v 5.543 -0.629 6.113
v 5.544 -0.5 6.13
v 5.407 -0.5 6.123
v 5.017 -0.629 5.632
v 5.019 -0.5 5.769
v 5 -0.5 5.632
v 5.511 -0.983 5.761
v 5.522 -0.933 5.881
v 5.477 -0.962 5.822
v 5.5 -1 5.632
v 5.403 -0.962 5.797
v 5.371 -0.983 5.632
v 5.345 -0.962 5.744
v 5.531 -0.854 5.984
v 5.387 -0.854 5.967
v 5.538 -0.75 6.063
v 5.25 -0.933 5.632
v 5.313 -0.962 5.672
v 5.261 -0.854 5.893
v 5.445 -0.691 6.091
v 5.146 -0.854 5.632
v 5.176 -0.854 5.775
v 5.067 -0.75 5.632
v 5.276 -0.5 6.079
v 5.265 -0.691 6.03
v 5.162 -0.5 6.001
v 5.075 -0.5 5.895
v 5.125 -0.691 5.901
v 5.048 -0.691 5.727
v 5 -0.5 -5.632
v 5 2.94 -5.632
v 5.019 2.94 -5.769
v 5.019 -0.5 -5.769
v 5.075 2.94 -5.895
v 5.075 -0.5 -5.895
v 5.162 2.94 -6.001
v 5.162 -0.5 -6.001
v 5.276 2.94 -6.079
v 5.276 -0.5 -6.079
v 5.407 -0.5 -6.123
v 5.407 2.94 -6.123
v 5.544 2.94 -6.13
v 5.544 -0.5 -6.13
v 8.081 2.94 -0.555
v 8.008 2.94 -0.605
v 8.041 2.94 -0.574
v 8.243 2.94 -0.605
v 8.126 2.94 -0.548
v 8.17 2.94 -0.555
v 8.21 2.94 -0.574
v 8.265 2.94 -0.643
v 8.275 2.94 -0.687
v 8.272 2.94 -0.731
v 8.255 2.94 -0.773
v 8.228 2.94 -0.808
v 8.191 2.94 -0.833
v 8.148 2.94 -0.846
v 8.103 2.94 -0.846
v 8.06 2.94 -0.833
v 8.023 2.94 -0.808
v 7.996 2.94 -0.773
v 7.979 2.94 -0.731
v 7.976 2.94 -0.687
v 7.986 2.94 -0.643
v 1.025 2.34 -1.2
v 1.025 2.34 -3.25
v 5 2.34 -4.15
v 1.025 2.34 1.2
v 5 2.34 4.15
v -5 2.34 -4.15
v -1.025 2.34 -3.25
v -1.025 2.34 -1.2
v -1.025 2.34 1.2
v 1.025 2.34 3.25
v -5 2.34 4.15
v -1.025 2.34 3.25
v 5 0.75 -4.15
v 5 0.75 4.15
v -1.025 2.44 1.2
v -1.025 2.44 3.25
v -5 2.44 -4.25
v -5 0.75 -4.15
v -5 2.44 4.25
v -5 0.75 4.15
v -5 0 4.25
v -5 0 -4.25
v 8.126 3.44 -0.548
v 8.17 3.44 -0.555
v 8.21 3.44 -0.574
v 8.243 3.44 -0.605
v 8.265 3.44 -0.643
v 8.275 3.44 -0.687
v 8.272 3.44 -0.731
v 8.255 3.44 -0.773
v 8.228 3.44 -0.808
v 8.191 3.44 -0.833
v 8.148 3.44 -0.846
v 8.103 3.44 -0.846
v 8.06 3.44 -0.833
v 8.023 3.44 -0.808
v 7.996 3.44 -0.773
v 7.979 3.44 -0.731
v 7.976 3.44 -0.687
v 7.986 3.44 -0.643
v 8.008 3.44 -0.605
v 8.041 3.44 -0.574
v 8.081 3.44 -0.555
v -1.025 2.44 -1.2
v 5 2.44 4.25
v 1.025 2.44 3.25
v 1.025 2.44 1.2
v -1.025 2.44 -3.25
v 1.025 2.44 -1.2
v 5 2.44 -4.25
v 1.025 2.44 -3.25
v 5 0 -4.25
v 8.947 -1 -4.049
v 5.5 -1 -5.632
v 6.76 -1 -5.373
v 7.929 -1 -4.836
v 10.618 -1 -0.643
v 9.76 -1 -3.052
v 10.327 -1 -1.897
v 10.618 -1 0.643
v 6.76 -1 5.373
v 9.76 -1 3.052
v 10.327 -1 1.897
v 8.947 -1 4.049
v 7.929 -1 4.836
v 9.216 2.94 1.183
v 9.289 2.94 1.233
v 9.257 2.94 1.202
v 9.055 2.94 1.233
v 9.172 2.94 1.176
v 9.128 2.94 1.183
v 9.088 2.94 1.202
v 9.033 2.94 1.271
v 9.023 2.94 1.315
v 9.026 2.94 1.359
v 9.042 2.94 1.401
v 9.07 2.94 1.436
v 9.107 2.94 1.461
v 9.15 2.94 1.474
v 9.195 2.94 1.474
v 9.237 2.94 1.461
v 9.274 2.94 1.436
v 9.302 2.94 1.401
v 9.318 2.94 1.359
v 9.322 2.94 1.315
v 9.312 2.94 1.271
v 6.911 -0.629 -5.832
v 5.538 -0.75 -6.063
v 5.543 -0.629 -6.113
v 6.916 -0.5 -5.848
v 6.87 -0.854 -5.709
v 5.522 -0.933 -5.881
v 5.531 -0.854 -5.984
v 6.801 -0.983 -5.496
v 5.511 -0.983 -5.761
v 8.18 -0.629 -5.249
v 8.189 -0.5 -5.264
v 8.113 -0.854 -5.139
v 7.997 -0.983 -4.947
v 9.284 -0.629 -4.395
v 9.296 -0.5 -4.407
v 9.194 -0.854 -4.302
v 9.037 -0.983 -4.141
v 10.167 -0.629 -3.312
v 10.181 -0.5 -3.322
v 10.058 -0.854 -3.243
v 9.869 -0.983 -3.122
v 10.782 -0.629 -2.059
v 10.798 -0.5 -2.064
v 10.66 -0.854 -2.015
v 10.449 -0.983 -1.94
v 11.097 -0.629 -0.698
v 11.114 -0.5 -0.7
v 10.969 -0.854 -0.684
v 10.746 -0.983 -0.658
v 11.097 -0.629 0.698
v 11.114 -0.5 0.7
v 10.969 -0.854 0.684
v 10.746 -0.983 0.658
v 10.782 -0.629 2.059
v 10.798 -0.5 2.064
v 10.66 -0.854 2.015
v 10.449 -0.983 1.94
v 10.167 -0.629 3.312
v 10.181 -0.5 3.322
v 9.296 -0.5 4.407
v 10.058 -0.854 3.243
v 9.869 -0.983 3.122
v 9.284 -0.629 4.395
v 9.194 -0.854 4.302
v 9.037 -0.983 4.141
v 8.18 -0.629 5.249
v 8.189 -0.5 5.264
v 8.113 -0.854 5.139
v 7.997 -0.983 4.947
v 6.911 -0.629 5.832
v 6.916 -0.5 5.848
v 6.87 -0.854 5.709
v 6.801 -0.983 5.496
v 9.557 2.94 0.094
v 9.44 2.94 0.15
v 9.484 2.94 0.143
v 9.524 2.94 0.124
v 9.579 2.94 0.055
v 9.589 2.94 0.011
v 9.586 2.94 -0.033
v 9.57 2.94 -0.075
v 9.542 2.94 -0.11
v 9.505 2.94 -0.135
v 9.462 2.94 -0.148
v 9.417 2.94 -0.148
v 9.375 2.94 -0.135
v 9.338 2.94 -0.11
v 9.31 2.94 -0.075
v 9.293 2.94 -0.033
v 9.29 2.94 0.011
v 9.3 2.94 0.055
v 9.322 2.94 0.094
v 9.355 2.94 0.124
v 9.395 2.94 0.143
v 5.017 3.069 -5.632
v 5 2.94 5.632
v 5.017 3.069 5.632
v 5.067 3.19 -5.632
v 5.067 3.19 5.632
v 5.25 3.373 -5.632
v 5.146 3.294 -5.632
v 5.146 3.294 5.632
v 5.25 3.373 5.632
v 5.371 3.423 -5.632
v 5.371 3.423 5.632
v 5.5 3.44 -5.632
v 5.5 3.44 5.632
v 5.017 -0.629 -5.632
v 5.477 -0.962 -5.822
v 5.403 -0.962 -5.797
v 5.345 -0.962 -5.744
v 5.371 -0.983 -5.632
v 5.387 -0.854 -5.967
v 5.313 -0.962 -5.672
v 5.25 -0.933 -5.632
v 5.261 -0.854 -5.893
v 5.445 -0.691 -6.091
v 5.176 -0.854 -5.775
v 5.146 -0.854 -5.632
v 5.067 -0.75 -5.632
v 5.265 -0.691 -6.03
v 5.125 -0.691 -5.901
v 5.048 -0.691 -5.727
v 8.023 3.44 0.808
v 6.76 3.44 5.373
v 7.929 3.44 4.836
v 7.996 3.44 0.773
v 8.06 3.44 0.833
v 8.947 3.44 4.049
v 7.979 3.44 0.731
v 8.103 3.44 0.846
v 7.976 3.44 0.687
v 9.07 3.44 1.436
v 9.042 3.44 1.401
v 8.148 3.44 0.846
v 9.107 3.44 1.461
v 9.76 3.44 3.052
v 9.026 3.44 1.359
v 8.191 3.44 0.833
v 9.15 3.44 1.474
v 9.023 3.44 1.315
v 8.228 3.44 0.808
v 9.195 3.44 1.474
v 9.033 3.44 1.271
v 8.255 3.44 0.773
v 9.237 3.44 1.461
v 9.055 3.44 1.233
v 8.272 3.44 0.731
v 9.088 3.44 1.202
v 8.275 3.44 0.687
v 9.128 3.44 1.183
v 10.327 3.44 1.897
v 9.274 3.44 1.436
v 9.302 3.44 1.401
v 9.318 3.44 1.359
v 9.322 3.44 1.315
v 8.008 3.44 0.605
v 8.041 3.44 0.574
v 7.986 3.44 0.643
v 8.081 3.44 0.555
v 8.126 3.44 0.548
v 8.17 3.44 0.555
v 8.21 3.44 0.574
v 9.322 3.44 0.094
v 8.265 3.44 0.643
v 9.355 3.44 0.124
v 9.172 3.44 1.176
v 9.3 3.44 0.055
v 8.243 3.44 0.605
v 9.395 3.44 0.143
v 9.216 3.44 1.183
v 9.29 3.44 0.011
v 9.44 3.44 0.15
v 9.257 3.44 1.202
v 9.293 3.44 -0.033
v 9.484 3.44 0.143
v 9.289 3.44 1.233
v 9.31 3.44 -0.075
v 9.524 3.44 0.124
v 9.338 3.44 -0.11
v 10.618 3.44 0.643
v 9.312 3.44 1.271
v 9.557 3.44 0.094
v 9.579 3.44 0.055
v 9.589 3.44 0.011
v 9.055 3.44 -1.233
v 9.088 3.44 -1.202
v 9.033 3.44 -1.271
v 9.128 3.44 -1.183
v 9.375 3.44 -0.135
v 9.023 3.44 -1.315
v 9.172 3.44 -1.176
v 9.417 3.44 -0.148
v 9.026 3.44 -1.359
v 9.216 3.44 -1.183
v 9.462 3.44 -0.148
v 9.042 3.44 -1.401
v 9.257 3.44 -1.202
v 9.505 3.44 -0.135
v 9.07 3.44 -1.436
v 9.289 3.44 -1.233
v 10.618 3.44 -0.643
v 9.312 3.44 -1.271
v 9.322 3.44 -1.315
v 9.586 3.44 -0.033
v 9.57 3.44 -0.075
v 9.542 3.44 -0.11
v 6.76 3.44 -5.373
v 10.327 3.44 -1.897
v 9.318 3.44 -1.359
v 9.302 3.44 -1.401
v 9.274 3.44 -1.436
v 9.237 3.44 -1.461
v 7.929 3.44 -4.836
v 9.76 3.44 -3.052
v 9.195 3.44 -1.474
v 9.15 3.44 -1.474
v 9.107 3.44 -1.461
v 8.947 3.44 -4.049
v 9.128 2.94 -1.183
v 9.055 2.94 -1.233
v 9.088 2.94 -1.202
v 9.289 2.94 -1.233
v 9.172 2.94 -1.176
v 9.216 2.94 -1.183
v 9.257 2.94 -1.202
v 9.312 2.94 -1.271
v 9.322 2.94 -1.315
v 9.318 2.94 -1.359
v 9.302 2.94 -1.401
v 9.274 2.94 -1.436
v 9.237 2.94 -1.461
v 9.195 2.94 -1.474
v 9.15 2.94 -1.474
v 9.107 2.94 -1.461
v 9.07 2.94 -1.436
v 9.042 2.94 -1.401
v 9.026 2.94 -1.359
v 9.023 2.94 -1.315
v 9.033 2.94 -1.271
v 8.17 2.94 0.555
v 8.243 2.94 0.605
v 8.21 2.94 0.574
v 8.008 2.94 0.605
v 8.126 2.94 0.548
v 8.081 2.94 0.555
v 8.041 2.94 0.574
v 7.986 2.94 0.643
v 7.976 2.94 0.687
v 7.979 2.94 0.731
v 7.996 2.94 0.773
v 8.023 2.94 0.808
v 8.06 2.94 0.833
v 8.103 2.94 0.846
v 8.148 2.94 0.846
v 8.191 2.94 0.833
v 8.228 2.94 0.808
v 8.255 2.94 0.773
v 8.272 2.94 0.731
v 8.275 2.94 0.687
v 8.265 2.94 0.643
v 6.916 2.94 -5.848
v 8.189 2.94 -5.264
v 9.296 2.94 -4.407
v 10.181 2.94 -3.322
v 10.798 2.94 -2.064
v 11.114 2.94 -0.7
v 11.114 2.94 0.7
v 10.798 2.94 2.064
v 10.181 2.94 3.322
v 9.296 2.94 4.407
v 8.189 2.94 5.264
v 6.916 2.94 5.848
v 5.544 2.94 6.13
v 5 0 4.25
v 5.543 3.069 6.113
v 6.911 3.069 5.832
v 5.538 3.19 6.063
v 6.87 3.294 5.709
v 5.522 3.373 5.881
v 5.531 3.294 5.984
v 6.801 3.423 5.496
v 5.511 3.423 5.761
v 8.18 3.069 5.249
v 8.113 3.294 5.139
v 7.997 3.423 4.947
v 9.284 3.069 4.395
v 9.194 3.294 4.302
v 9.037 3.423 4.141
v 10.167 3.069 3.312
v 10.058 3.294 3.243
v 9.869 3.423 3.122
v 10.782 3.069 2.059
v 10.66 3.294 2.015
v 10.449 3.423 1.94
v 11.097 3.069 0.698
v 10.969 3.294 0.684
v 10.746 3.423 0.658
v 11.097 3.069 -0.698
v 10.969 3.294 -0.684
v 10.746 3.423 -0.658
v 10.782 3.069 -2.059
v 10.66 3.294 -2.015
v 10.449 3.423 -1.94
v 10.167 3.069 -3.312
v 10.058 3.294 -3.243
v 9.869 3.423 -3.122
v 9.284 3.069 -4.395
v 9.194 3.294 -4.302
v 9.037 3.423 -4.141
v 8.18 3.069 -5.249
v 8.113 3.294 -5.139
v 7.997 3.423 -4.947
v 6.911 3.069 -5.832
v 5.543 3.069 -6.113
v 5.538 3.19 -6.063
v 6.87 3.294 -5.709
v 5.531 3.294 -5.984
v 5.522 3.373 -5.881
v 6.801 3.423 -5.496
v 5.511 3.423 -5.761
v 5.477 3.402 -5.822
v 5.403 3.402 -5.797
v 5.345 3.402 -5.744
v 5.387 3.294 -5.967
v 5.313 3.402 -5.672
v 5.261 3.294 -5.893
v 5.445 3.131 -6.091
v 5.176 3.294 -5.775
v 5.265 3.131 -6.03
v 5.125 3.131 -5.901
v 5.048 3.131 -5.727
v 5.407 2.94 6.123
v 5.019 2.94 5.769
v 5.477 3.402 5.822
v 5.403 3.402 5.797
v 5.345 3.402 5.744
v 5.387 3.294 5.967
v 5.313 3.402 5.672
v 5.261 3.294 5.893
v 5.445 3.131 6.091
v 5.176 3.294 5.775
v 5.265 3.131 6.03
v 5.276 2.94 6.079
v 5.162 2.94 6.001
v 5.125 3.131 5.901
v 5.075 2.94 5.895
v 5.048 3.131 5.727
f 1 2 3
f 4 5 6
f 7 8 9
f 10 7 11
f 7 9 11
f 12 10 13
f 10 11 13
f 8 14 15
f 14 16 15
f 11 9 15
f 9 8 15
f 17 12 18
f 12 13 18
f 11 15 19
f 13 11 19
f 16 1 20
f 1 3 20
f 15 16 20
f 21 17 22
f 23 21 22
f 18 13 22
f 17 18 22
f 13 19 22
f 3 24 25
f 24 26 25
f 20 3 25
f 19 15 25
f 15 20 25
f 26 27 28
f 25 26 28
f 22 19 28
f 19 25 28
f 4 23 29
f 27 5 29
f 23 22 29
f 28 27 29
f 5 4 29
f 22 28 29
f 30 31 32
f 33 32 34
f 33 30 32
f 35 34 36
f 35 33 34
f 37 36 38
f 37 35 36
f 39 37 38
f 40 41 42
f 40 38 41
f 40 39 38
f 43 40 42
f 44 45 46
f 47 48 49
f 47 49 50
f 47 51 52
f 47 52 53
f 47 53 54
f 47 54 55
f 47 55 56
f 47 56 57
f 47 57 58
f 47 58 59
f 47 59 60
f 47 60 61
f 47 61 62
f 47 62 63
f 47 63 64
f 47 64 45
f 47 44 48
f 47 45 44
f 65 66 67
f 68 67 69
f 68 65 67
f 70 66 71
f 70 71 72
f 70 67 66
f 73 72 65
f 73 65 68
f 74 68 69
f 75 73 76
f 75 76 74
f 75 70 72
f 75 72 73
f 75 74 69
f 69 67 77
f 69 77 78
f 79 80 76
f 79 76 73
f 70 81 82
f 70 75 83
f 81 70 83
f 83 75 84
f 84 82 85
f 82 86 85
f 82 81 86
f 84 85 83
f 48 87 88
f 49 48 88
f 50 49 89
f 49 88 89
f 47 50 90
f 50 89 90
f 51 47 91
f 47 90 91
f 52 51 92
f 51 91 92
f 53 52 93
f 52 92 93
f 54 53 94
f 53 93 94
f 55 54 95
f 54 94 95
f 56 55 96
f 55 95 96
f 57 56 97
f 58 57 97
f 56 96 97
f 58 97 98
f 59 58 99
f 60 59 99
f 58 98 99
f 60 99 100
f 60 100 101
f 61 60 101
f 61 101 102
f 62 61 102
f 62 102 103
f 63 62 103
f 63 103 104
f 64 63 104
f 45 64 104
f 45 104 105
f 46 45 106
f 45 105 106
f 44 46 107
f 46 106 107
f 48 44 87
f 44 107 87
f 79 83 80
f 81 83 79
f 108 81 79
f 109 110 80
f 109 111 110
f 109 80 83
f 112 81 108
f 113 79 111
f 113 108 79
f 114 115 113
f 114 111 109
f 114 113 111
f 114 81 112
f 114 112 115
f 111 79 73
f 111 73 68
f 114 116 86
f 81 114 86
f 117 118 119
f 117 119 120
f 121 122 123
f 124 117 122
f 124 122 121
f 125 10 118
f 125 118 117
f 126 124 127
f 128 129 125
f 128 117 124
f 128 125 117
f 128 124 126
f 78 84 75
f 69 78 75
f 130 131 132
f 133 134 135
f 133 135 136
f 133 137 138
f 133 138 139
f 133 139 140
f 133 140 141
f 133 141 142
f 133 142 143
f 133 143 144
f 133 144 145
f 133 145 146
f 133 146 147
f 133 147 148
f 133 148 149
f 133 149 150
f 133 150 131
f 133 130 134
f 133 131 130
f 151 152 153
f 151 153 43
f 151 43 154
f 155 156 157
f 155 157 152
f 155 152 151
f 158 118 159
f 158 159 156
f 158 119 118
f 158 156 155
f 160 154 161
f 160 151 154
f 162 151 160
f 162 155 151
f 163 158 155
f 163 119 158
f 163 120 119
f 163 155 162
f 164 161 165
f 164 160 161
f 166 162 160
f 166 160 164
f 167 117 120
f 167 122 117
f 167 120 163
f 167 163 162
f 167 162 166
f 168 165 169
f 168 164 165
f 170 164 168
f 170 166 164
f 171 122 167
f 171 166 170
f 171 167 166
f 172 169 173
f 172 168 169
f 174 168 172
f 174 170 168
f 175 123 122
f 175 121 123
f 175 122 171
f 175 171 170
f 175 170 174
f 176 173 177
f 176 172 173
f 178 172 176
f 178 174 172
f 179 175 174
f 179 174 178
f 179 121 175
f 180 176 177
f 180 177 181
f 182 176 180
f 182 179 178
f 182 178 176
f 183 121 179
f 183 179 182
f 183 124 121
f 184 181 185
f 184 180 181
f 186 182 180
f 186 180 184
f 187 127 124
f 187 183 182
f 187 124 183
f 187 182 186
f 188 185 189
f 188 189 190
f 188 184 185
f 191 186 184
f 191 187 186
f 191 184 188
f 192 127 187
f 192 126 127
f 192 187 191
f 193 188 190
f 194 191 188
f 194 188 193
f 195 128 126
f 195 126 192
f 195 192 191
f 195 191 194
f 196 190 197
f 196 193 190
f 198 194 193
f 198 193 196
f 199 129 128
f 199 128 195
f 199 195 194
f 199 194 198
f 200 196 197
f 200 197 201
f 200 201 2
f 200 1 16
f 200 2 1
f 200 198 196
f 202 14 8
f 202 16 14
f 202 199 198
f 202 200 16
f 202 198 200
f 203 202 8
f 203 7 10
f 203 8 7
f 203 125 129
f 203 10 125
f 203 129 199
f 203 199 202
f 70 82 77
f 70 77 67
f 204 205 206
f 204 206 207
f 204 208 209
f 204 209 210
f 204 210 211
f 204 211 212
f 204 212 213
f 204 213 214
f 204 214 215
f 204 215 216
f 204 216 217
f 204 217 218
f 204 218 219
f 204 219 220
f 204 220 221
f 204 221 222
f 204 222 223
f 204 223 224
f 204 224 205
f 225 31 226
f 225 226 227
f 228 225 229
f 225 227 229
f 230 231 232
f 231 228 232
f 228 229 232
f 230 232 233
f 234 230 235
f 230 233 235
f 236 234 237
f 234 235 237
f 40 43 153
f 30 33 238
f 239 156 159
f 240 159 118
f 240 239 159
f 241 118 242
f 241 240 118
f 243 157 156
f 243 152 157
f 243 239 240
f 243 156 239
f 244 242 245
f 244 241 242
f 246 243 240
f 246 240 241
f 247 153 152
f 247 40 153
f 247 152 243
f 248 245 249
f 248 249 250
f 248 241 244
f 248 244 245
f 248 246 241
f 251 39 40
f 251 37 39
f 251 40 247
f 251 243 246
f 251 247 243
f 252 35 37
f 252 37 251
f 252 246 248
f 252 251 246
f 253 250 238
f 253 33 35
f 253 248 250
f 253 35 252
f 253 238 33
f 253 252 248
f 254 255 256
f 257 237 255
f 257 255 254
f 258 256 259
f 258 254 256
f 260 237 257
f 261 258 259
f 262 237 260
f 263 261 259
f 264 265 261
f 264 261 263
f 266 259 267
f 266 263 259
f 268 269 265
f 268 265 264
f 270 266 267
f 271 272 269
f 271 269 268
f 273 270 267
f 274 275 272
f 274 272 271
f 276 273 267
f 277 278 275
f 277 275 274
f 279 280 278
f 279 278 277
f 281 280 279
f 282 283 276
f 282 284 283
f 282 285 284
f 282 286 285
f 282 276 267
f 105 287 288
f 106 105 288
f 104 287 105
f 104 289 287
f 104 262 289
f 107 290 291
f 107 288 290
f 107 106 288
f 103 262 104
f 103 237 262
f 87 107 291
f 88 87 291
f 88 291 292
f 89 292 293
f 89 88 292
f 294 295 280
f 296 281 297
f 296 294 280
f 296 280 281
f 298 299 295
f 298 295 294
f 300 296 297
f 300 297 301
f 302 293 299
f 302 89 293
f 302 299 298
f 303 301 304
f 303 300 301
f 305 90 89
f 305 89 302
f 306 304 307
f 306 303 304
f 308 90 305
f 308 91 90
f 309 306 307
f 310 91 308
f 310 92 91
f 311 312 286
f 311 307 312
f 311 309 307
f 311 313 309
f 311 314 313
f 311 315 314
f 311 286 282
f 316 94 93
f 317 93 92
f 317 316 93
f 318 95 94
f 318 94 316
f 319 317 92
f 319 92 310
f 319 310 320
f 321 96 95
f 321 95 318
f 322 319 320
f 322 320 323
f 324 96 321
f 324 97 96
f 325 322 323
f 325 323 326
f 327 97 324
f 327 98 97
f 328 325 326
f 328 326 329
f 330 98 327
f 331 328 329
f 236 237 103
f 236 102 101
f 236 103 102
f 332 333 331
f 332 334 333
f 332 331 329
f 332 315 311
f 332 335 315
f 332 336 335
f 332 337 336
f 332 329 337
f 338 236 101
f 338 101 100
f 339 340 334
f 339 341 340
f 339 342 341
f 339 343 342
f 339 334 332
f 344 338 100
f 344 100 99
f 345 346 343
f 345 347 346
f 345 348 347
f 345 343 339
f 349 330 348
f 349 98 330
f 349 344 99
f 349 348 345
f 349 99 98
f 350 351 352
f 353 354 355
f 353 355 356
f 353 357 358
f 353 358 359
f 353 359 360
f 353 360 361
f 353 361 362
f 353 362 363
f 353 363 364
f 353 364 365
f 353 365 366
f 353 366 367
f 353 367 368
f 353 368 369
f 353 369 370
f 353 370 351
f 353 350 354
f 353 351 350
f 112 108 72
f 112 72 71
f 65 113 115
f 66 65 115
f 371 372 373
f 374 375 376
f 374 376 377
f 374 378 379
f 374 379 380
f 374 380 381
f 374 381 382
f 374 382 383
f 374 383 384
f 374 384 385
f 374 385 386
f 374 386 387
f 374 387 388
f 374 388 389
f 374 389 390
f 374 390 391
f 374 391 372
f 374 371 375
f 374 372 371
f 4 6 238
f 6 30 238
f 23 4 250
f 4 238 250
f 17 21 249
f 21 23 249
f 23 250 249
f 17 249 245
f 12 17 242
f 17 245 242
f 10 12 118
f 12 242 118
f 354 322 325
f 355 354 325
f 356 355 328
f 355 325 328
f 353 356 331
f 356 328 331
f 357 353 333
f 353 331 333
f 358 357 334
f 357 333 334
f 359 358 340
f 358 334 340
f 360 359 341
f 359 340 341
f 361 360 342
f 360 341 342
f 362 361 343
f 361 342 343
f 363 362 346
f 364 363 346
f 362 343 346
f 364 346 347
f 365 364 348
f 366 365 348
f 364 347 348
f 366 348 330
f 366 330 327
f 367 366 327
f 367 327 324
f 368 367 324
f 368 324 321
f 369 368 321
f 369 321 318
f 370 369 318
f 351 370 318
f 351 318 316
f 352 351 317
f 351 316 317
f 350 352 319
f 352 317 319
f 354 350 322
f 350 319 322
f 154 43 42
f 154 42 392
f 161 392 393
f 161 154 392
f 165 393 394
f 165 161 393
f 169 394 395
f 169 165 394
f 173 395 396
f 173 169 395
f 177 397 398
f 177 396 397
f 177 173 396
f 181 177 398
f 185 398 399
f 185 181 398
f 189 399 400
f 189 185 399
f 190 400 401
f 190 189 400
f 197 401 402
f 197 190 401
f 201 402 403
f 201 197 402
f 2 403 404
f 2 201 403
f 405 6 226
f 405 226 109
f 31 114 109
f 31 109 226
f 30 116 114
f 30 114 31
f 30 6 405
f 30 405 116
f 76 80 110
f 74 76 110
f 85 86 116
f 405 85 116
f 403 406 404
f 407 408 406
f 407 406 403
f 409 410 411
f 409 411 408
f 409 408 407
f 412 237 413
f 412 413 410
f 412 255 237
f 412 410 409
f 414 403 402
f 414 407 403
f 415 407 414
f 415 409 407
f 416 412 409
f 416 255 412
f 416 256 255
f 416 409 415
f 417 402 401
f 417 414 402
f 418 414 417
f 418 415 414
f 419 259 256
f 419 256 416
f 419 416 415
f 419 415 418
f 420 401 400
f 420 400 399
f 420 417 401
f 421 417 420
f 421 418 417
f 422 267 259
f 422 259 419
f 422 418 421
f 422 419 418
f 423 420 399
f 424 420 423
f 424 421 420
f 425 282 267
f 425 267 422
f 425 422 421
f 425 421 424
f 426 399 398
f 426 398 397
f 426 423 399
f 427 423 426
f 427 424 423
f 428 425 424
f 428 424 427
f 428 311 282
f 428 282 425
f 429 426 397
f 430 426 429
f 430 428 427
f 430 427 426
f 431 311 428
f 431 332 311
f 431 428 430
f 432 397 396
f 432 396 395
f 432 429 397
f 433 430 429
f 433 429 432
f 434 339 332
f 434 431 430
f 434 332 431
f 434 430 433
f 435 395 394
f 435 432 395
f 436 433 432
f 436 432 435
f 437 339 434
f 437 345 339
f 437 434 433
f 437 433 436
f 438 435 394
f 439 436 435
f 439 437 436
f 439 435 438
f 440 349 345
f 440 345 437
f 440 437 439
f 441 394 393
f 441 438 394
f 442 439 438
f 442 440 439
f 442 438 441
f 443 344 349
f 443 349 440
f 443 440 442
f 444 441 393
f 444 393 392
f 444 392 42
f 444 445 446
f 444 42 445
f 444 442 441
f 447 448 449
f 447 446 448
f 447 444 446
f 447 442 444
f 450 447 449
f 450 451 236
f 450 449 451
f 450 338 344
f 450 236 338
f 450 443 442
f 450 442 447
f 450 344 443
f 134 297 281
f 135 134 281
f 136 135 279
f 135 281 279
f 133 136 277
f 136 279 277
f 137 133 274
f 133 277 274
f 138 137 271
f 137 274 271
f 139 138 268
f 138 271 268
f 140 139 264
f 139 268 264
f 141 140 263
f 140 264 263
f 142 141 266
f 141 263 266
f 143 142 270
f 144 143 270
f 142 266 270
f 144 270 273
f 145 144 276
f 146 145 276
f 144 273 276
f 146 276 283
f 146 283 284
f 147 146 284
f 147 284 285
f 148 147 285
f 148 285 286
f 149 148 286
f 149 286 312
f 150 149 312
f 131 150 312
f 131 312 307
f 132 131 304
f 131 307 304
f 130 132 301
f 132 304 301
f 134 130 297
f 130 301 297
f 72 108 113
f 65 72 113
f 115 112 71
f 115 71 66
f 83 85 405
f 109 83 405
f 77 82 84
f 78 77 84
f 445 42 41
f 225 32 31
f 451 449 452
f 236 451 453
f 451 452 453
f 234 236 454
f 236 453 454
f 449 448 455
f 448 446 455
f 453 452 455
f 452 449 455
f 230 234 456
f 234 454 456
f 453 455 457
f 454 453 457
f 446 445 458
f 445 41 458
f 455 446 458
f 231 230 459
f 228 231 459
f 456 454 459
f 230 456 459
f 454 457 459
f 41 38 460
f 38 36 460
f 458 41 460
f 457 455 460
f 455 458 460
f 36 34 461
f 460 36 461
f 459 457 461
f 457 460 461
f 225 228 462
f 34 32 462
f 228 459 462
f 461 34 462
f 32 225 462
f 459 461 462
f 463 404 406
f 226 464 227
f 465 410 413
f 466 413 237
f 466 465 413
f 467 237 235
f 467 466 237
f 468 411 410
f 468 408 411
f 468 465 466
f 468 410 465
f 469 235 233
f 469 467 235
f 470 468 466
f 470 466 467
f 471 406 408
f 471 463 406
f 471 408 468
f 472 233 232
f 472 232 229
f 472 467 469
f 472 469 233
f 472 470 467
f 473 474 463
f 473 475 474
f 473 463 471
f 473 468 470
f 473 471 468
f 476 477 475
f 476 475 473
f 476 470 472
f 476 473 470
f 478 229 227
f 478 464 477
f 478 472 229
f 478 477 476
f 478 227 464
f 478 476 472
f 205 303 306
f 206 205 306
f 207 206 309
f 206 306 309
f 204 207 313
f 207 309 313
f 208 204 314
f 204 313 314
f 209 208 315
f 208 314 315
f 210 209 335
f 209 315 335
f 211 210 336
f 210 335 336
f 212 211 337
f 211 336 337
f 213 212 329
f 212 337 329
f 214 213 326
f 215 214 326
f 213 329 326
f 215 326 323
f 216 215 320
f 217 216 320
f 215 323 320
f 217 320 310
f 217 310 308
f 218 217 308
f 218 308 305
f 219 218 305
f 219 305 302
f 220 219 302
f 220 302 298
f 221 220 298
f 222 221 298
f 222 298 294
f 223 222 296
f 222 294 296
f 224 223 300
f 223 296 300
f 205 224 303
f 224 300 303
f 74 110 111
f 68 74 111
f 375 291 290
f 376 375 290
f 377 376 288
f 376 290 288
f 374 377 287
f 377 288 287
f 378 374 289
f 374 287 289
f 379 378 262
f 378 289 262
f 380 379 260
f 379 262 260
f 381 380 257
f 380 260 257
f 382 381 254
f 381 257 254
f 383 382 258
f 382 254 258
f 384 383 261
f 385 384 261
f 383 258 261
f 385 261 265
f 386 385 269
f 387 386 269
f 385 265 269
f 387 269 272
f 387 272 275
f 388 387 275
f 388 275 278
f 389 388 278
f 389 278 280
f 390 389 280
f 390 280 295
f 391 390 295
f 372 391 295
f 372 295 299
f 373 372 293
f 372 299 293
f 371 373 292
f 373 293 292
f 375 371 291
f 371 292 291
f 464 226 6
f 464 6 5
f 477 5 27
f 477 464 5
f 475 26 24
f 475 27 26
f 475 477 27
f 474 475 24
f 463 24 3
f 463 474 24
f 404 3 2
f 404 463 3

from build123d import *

# Parameters (mm, degrees)
BOSS_EXTRUDE1_DEPTH = 2.44
BOSS_EXTRUDE2_DEPTH = 1
BOSS_EXTRUDE3_START = 1
BOSS_EXTRUDE3_DEPTH = 1
SKETCH4_W           = 8.3
SKETCH4_H           = 1.59
CUT_EXTRUDE1_DEPTH  = 10
FILLET1_R           = 0.5
SKETCH5_R           = 0.15
CUT_EXTRUDE2_DEPTH  = 0.5
SKETCH6_W           = 2.05
SKETCH6_H           = 2.05
CUT_EXTRUDE3_DEPTH  = 0.5


with BuildPart() as part:
    # Sketch1 → Boss-Extrude1 (new body)
    with BuildSketch(Plane(origin=(0, 0, 0), x_dir=(1, 0, 0), z_dir=(0, 1, 0))):
        with BuildLine():
            Line((5, 6.154307787), (5, 4.25))
            Line((5, 4.25), (-5, 4.25))
            Line((-5, 4.25), (-5, -4.25))
            Line((-5, -4.25), (5, -4.25))
            Line((5, -4.25), (5, -6.154307787))
            ThreePointArc((5, -6.154307787), (11.154307787, 0), (5, 6.154307787))
        make_face()
    extrude(amount=BOSS_EXTRUDE1_DEPTH)

    # Sketch2 → Boss-Extrude2 (add)
    with BuildSketch(Plane(origin=(0, 2.44, 0), x_dir=(1, 0, 0), z_dir=(0, 1, 0))):
        with BuildLine():
            Line((5, 6.154307787), (5, -6.154307787))
            ThreePointArc((5, -6.154307787), (11.154307787, 0), (5, 6.154307787))
        make_face()
    extrude(amount=BOSS_EXTRUDE2_DEPTH)

    # Sketch3 → Boss-Extrude3 (add)
    with BuildSketch(Plane.XZ.offset(BOSS_EXTRUDE3_START)):
        with BuildLine():
            Line((5, 6.154307787), (5, -6.154307787))
            ThreePointArc((5, -6.154307787), (11.154307787, 0), (5, 6.154307787))
        make_face()
    extrude(amount=-BOSS_EXTRUDE3_DEPTH)

    # Sketch4 → Cut-Extrude1 (cut)
    with BuildSketch(Plane.ZY.offset(5)):
        with Locations((0, 1.545)):
            Rectangle(SKETCH4_W, SKETCH4_H)
    extrude(amount=-CUT_EXTRUDE1_DEPTH, mode=Mode.SUBTRACT)

    # Fillet1
    fillet1_edges = [part.edges().sort_by_distance(p)[0] for p in [
        (5, 1.22, -6.154307787),
        (5, 1.22, 6.154307787),
        (11.154307787, 3.44, 0),
        (5, 3.44, 0),
        (11.154307787, -1, 0),
        (5, -1, 0),
    ]]
    fillet(fillet1_edges, radius=FILLET1_R)

    # Sketch5 → Cut-Extrude2 (cut)
    with BuildSketch(Plane(origin=(0, 3.44, 0), x_dir=(1, 0, 0), z_dir=(0, 1, 0))):
        with Locations(Location((9.172175781, 1.326041416, 0), (0, 0, 270))):
            Circle(SKETCH5_R)
        with Locations(Location((8.125504079, 0.698038394, 0), (0, 0, 270))):
            Circle(SKETCH5_R)
        with Locations(Location((9.439658549, 0, 0), (0, 0, 270))):
            Circle(SKETCH5_R)
        with Locations(Location((9.172175781, -1.326041416, 0), (0, 0, 90))):
            Circle(SKETCH5_R)
        with Locations(Location((8.125504079, -0.698038394, 0), (0, 0, 90))):
            Circle(SKETCH5_R)
    extrude(amount=-CUT_EXTRUDE2_DEPTH, mode=Mode.SUBTRACT)

    # Sketch6 → Cut-Extrude3 (cut)
    with BuildSketch(Plane(origin=(0, 2.44, 0), x_dir=(1, 0, 0), z_dir=(0, 1, 0))):
        with Locations((0, -2.225)):
            Rectangle(SKETCH6_W, SKETCH6_H)
        with Locations((0, 2.225)):
            Rectangle(SKETCH6_W, SKETCH6_H)
    extrude(amount=-CUT_EXTRUDE3_DEPTH, mode=Mode.SUBTRACT)


solid = part.part
